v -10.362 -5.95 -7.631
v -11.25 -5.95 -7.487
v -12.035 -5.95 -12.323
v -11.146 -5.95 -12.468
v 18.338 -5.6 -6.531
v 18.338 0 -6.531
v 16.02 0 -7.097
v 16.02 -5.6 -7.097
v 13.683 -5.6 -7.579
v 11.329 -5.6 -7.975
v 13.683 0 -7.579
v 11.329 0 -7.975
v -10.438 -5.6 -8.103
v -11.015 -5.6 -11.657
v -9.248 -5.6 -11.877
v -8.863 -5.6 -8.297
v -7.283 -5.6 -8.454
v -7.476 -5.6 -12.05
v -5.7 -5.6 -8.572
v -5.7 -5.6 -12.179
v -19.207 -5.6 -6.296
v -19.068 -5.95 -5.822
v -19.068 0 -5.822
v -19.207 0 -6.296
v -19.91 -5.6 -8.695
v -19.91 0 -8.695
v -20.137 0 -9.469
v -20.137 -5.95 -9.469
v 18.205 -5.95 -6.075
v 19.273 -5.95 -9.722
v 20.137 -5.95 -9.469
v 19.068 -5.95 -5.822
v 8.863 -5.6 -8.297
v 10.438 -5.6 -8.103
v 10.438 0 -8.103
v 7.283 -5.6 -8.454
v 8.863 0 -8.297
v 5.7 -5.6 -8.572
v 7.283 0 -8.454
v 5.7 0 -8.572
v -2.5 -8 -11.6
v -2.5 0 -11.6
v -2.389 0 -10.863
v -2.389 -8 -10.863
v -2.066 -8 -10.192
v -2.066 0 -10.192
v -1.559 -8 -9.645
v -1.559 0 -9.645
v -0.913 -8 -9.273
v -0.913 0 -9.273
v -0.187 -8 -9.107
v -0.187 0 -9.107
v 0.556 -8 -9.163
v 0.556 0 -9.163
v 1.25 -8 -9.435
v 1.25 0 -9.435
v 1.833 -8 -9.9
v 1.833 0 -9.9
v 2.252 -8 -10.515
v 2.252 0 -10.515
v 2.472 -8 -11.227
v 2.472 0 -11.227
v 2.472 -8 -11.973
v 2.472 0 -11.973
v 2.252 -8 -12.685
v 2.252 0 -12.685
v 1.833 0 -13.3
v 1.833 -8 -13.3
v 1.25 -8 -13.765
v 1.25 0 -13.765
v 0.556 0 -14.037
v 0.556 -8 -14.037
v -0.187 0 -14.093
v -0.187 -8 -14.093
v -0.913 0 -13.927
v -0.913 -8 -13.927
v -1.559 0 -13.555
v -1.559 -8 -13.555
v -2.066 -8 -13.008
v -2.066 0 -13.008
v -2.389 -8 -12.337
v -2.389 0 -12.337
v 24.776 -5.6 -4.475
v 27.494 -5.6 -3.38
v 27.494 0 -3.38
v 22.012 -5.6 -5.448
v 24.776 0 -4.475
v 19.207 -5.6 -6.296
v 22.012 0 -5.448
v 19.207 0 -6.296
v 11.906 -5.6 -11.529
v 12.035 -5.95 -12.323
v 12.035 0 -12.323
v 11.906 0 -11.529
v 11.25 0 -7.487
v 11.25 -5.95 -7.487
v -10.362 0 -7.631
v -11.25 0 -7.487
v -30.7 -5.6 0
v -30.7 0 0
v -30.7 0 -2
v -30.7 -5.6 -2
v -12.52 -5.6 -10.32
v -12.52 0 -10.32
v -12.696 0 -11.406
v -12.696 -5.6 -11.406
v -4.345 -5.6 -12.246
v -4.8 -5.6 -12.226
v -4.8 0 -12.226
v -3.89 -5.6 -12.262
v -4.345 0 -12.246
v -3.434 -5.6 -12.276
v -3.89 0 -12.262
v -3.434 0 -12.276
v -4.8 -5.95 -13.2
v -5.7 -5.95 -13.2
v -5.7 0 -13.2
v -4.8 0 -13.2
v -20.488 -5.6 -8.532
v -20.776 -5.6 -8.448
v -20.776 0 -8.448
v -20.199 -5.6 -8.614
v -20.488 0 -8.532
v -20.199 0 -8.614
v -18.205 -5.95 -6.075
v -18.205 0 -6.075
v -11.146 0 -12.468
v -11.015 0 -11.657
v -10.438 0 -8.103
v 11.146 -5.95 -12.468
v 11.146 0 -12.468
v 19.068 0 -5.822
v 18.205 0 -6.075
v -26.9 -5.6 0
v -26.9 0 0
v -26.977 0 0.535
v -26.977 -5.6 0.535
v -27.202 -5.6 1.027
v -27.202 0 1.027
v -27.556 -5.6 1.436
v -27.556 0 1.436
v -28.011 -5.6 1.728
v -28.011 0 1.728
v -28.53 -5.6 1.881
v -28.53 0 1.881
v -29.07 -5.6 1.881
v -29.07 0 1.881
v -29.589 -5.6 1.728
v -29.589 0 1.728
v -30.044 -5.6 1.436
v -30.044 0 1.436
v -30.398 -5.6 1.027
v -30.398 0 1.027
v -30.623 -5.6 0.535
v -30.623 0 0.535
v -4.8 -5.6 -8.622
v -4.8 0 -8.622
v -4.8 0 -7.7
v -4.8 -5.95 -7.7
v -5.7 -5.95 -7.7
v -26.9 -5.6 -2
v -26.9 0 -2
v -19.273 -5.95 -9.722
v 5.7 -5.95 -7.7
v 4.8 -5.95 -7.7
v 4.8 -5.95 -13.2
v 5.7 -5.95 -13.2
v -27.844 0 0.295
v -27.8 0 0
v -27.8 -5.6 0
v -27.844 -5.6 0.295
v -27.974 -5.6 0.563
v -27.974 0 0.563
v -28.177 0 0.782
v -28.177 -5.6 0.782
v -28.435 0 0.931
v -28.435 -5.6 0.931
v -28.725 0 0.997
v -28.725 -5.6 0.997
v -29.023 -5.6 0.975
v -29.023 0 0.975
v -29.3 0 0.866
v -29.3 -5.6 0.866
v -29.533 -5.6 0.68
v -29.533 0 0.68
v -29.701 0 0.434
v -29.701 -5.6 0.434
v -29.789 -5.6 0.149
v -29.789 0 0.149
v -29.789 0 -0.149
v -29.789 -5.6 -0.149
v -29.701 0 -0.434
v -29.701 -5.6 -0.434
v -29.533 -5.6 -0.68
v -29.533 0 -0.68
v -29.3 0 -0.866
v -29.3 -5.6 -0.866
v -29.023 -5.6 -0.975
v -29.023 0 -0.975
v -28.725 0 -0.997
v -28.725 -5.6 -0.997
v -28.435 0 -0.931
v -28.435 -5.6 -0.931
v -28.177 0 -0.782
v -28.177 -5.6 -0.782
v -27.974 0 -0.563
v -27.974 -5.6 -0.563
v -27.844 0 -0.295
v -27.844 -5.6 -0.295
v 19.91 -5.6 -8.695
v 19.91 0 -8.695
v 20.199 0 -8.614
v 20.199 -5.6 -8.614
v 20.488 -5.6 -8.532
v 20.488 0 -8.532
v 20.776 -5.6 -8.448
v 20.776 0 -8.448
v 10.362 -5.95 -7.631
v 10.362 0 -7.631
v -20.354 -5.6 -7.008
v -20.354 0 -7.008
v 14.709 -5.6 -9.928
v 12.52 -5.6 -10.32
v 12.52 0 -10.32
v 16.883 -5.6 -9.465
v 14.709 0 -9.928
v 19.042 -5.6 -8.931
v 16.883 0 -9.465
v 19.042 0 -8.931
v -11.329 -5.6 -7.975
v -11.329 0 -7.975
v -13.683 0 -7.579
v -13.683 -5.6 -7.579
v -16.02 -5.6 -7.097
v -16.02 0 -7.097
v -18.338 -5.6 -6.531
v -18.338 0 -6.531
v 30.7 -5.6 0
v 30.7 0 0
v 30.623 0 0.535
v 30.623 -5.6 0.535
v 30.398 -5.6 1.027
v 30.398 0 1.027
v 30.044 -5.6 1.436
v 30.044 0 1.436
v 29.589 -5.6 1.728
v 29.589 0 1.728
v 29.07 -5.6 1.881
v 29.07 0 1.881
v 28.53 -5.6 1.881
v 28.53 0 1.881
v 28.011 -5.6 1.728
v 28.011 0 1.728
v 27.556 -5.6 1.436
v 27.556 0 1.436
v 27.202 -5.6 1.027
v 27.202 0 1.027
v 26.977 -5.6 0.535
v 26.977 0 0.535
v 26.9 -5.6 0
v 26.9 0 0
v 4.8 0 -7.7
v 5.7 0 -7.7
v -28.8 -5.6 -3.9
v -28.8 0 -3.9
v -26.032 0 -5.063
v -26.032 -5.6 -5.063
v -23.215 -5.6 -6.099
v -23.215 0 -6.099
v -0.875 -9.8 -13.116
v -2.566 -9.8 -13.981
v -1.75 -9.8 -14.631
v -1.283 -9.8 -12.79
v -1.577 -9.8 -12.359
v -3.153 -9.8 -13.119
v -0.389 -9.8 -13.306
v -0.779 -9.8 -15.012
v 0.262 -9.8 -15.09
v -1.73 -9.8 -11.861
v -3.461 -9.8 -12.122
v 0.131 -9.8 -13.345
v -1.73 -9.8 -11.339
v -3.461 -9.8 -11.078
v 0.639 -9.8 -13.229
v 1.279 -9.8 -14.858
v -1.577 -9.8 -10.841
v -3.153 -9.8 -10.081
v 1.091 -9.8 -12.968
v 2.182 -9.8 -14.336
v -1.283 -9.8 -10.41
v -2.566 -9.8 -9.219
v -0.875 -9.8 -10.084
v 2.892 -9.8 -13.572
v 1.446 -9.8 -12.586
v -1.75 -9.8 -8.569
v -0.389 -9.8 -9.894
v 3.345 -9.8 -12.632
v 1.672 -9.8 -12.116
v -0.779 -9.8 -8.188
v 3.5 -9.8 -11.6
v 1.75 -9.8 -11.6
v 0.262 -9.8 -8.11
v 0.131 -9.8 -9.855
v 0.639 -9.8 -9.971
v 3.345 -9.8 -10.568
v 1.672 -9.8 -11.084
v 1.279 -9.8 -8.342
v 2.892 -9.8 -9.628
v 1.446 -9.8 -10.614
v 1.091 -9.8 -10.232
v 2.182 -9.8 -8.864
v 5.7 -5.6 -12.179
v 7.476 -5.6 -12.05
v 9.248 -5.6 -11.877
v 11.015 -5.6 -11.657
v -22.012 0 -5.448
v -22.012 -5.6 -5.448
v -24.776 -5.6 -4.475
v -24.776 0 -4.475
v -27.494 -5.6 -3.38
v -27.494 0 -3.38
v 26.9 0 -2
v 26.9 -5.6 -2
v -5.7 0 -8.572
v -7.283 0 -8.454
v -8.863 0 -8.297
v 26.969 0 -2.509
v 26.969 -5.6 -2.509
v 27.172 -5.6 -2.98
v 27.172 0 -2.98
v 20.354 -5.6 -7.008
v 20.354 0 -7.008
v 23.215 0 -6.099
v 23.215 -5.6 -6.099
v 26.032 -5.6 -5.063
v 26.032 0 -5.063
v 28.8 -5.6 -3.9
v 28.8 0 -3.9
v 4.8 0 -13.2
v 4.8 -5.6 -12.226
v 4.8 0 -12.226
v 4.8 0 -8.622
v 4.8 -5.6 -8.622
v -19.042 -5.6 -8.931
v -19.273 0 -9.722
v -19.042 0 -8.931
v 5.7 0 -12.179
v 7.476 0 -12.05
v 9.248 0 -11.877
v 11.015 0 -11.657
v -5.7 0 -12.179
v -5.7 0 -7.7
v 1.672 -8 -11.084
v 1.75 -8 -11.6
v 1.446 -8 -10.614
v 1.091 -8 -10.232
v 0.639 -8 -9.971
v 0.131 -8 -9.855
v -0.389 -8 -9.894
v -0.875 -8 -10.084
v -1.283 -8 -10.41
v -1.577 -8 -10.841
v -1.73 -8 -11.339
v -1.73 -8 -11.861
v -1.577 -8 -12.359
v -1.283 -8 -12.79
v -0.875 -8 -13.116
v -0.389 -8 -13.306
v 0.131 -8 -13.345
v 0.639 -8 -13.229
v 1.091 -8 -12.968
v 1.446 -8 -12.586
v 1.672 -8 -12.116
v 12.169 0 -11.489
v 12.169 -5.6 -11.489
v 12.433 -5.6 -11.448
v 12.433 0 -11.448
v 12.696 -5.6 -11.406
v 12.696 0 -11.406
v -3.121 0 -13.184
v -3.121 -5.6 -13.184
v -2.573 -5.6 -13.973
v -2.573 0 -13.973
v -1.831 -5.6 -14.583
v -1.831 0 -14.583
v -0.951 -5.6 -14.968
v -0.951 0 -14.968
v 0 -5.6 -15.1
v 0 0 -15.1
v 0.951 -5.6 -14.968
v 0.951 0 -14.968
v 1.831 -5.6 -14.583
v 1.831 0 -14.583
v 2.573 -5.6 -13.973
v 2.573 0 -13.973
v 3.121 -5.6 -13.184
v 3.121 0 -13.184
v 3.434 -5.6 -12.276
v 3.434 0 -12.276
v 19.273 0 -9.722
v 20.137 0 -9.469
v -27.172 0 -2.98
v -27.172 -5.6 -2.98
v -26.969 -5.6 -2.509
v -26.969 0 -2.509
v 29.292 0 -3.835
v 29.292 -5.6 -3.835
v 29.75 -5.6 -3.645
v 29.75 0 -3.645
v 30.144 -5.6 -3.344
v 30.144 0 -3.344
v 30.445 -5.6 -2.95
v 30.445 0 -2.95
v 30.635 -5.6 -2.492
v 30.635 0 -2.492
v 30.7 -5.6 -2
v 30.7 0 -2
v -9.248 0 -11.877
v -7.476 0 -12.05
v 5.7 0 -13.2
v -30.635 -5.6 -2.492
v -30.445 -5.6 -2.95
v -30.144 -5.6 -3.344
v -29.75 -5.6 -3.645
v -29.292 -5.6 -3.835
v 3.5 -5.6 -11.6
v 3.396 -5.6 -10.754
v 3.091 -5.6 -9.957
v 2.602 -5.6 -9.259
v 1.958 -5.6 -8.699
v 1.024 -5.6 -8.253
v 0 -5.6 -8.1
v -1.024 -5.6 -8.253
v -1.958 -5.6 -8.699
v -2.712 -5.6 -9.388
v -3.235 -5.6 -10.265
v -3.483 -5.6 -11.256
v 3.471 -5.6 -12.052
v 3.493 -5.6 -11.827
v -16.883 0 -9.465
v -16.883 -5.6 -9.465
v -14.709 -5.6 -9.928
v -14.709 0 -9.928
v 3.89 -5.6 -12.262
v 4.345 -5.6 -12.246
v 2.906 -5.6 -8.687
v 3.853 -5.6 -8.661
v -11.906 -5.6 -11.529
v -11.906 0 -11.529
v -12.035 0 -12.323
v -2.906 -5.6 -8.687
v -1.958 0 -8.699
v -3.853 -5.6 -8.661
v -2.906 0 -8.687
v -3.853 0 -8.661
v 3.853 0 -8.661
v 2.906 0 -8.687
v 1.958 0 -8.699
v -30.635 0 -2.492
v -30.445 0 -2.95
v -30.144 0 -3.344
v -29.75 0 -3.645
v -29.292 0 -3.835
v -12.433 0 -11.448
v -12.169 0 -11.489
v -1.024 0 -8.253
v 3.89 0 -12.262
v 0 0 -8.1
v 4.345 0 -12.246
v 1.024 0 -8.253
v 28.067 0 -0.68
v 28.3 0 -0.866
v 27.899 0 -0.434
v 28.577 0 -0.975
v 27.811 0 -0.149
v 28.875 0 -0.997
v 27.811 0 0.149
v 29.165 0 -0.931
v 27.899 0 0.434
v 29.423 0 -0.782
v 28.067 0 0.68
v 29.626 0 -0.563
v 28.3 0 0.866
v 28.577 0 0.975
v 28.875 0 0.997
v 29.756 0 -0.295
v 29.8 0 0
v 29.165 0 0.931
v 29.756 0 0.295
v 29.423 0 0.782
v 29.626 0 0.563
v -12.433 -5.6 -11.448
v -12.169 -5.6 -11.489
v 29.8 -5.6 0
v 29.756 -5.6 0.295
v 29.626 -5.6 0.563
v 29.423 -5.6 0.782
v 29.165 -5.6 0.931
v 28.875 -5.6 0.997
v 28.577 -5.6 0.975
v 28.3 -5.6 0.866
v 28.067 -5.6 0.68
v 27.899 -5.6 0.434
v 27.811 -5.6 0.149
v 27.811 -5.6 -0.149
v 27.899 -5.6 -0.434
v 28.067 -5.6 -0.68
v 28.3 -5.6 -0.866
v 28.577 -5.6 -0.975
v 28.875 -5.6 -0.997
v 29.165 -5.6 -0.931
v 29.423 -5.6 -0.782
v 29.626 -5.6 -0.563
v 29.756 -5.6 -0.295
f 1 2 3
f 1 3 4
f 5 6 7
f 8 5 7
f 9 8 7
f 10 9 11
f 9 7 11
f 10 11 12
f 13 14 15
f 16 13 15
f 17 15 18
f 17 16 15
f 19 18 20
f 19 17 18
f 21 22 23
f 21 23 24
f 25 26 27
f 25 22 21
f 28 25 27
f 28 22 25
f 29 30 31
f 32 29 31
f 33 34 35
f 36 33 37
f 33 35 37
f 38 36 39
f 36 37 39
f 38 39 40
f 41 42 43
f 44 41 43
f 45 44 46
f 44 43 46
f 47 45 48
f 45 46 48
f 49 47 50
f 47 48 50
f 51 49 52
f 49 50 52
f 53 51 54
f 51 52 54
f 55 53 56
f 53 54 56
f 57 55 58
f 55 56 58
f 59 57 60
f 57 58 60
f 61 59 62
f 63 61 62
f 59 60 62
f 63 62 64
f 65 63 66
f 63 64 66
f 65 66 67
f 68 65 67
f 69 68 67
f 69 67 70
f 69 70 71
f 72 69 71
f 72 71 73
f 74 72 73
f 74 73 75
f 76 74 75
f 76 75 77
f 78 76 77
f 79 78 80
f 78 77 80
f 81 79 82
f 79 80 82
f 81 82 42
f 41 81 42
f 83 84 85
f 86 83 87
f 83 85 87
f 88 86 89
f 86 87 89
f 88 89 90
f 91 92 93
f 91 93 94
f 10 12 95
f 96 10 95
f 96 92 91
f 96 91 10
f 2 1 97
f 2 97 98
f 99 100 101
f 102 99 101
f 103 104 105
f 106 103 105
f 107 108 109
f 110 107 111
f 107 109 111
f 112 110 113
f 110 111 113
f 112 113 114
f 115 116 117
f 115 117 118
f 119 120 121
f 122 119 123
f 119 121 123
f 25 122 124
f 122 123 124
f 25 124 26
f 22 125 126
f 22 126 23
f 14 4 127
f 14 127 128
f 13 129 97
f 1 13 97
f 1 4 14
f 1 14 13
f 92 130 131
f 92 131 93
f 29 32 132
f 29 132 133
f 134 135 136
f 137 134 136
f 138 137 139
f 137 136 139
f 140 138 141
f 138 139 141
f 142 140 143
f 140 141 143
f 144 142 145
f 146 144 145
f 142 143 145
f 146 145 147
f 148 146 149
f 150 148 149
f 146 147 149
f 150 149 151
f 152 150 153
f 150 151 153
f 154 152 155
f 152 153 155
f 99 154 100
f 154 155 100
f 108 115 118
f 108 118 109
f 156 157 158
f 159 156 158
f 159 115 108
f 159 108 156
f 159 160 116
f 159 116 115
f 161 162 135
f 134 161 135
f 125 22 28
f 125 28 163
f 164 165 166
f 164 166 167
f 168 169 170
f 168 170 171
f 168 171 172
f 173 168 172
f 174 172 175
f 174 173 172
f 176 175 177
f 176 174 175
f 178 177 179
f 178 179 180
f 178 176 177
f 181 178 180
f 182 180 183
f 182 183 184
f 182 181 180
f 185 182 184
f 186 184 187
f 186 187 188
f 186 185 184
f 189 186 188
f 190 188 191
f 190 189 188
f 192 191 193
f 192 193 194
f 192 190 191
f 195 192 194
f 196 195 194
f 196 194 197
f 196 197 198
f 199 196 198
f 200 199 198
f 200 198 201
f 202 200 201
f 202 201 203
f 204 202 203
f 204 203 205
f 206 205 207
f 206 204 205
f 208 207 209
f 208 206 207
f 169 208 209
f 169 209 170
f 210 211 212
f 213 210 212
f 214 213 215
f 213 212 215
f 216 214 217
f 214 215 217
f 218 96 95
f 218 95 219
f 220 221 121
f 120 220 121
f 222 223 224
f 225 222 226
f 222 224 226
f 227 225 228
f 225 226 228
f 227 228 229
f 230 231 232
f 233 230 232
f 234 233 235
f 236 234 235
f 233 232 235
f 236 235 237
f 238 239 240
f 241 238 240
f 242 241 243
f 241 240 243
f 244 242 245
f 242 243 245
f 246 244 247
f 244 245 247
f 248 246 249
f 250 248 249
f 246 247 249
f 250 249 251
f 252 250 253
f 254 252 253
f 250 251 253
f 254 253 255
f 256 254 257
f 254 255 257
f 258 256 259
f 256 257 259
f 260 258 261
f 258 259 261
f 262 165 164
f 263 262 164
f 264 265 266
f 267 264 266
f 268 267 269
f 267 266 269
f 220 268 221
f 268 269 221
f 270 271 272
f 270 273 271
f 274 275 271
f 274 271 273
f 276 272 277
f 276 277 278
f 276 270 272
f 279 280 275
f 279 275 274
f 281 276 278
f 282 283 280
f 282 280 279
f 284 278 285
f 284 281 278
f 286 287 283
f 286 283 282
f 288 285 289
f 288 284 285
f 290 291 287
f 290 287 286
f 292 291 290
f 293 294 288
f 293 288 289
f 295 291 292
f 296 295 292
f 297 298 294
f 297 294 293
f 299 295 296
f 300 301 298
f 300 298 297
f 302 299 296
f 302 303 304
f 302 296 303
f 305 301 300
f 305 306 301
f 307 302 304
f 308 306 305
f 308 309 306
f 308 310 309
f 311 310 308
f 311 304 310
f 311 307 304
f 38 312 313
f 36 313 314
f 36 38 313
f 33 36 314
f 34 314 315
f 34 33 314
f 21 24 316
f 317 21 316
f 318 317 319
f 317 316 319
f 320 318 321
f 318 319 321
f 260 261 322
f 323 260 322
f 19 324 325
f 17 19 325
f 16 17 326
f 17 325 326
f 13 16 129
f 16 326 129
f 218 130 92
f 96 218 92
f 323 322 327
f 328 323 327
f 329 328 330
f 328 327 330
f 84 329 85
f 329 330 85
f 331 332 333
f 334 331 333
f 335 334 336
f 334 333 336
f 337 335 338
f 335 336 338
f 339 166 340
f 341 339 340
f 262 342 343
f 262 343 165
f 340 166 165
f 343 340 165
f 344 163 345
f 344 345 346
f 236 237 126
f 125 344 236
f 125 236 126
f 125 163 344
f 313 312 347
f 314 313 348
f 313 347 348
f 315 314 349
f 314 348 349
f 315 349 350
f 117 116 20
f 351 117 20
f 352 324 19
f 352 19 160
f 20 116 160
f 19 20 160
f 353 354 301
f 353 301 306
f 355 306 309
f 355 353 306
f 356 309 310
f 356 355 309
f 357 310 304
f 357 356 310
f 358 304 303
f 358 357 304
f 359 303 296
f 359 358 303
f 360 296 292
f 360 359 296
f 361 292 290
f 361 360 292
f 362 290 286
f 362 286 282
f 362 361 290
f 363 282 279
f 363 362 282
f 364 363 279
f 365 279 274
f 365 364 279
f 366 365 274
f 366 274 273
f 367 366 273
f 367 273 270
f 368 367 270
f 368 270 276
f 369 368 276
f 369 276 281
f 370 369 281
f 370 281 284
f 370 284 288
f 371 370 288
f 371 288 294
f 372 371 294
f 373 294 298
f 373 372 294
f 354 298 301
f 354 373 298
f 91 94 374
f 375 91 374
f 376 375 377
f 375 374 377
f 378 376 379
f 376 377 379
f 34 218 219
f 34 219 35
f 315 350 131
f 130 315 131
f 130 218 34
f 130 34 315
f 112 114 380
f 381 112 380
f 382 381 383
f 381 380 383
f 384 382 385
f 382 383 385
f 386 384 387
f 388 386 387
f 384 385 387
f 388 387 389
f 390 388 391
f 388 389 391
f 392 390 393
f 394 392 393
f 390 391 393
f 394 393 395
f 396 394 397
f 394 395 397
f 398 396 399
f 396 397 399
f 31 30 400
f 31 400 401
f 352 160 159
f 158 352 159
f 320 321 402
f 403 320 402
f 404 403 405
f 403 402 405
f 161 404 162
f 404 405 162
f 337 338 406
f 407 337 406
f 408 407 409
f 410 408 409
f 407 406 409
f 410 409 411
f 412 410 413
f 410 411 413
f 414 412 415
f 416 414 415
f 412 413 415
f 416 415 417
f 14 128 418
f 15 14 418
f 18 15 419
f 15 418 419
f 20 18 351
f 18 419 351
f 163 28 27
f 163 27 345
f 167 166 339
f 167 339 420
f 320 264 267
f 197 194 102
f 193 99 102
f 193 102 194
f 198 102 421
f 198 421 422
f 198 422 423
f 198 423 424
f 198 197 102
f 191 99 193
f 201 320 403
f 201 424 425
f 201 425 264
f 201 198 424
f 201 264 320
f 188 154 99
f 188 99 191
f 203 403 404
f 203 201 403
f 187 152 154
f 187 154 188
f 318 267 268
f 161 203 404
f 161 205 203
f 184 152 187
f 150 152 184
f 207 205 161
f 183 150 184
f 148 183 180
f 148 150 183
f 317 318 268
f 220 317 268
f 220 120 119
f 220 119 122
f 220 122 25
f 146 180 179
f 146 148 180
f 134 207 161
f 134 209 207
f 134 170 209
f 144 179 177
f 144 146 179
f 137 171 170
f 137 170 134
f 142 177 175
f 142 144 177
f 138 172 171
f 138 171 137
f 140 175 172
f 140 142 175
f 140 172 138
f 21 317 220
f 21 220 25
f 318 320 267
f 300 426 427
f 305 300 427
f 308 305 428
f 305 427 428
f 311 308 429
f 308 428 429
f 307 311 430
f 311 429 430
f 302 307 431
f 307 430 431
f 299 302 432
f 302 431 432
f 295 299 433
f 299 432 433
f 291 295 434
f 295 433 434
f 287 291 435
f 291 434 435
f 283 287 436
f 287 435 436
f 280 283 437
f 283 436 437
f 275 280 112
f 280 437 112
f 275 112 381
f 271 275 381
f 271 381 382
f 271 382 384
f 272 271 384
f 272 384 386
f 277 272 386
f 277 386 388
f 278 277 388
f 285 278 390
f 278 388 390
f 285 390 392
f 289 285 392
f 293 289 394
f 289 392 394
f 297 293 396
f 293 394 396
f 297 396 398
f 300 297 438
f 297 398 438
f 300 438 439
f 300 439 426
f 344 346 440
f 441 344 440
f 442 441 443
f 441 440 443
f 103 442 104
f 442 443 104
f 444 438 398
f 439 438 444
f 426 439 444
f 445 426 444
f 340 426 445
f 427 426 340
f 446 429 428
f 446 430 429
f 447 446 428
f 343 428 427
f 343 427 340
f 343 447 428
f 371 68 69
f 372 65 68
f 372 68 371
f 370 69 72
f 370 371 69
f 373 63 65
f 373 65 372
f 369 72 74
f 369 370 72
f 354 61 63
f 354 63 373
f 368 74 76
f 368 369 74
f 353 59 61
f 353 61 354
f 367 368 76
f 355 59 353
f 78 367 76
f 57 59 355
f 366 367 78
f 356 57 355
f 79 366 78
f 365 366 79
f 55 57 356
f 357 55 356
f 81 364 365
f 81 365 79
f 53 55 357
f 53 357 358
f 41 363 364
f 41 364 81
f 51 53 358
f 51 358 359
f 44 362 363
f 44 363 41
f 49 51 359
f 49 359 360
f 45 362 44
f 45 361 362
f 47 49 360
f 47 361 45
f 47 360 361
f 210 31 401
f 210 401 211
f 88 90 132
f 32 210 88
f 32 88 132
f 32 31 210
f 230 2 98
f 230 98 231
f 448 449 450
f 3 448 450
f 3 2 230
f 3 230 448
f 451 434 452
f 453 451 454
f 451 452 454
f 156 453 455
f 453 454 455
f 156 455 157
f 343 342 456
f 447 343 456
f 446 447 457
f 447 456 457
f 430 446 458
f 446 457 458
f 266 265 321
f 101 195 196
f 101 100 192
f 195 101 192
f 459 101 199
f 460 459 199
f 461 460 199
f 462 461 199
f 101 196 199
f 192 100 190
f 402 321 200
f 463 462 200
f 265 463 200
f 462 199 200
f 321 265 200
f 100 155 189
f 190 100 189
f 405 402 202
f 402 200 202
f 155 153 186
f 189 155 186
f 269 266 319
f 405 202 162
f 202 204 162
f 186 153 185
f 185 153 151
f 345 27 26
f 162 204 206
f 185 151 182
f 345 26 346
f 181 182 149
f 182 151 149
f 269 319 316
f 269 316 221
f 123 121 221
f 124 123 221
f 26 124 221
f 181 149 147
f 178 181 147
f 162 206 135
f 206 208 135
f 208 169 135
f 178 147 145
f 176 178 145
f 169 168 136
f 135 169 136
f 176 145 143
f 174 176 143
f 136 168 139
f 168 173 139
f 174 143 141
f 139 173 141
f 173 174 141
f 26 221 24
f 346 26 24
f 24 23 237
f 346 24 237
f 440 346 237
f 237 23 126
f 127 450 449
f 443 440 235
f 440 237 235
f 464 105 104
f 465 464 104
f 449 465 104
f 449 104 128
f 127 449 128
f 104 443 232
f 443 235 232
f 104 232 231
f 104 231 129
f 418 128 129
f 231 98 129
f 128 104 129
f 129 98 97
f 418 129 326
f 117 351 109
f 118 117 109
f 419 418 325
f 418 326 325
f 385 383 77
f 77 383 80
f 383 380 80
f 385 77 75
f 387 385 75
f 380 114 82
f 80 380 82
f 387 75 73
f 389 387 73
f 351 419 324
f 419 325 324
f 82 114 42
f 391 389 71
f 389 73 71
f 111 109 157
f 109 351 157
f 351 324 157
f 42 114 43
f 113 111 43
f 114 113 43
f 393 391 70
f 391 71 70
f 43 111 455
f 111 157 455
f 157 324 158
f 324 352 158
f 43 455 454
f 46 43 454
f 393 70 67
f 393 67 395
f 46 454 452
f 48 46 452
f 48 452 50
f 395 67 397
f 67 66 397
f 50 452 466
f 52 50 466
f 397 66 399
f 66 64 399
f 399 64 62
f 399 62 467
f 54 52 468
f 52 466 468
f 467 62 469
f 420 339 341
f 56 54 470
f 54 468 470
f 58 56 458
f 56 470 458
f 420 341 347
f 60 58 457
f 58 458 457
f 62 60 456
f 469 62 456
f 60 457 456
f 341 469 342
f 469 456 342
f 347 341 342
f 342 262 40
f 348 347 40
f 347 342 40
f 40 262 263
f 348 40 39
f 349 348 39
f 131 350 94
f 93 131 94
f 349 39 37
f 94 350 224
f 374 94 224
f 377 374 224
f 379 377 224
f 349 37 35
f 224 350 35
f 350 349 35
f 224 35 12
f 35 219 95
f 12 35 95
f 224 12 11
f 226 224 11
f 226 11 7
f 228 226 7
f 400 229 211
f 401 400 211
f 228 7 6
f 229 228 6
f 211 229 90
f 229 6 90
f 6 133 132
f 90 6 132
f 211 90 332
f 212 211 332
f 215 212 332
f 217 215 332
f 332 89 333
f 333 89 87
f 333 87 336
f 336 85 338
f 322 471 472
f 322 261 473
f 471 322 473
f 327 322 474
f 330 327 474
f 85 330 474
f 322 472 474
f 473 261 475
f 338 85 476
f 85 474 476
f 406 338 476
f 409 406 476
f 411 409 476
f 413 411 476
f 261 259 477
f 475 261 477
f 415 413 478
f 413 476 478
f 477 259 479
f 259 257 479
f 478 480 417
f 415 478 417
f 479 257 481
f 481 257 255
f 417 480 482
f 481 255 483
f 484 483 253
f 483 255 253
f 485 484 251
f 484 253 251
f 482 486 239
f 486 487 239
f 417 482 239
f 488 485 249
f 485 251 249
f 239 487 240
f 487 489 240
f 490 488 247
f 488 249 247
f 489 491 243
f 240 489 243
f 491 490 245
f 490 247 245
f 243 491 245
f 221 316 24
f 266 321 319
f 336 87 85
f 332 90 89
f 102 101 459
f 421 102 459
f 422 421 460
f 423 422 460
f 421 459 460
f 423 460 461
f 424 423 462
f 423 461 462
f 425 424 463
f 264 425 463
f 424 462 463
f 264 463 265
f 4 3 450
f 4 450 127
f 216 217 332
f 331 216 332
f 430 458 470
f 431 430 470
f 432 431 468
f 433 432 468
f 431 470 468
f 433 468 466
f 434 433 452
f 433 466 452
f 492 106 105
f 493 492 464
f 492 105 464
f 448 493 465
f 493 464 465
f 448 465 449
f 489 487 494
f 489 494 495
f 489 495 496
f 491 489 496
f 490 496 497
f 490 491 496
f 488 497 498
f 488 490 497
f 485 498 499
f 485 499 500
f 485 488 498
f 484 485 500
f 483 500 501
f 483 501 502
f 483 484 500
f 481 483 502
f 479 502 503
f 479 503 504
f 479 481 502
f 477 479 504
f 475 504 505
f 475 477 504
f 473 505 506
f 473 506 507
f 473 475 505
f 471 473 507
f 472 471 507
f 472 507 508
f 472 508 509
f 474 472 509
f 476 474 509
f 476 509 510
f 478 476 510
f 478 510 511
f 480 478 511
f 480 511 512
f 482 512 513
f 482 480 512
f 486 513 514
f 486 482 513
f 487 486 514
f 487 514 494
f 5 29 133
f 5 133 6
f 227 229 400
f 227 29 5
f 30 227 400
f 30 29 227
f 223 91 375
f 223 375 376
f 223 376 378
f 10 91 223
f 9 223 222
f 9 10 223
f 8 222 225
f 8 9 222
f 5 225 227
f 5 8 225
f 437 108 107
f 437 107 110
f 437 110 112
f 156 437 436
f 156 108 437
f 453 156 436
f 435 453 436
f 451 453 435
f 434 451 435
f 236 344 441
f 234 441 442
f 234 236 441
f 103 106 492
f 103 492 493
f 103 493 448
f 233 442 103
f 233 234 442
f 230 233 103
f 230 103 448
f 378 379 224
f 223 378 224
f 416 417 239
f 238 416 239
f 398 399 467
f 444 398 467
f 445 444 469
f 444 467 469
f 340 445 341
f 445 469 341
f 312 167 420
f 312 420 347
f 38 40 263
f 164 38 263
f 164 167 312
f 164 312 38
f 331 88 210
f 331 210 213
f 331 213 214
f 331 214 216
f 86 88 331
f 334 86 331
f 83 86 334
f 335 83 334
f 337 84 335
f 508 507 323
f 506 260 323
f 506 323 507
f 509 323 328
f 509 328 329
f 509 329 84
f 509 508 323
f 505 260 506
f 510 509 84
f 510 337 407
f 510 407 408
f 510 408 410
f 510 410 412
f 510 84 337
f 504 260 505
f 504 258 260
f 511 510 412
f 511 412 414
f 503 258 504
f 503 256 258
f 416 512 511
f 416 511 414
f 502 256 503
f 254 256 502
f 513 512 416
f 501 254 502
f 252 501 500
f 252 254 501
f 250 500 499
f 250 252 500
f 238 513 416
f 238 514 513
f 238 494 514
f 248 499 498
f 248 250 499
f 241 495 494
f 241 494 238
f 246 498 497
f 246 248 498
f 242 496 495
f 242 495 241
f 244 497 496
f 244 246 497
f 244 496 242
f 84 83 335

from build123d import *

# Parameters (mm, degrees)
F0_R     = 1.75
F0_R_2   = 1
F1_DEPTH = 5.6
F3_W     = 0.9
F3_H     = 5.5
F4_DEPTH = 5.95
F5_R     = 3.5
F5_R_2   = 1.75
F6_DEPTH = 4.2
F7_R     = 2.5
F8_DEPTH = 8


with BuildPart() as f1:
    # F0 (on Front) → F1 (new body)
    with BuildSketch(Plane.XZ):
        with BuildLine():
            Line((-26.9, -2), (-26.9, 0))
            ThreePointArc((-26.9, 0), (-28.8, 1.9), (-30.7, 0))
            Line((-30.7, 0), (-30.7, -2))
            ThreePointArc((-30.7, -2), (-30.1435028843, -3.3435028843), (-28.8, -3.9))
            ThreePointArc((-28.8, -3.9), (-24.6294135718, -5.596855554), (-20.3538194655, -7.0083813116))
            Line((-20.3538194655, -7.0083813116), (-20.7757003916, -8.4478313747))
            ThreePointArc((-20.7757003916, -8.4478313747), (-16.6769659984, -9.5120684601), (-12.5200691265, -10.3198014574))
            Line((-12.5200691265, -10.3198014574), (-12.696252722, -11.4056003986))
            ThreePointArc((-12.696252722, -11.4056003986), (-8.0798243817, -11.9962992417), (-3.4341530829, -12.2757163632))
            ThreePointArc((-3.4341530829, -12.2757163632), (0, -15.1), (3.4341530829, -12.2757163632))
            ThreePointArc((3.4341530829, -12.2757163632), (3.235336932, -10.2648614543), (1.9581459203, -8.699023517))
            ThreePointArc((1.9581459203, -8.699023517), (0, -8.1), (-1.9581459203, -8.699023517))
            ThreePointArc((-1.9581459203, -8.699023517), (-14.9928565077, -7.3200147056), (-27.4941674529, -3.3801454123))
            ThreePointArc((-27.4941674529, -3.3801454123), (-27.0548521783, -2.7513049183), (-26.9, -2))
        make_face()
        with Locations((0, -11.6)):
            Circle(F0_R, mode=Mode.SUBTRACT)
        with Locations((-28.8, 0)):
            Circle(F0_R_2, mode=Mode.SUBTRACT)
        with BuildLine():
            ThreePointArc((27.4941674529, -3.3801454123), (14.9928565077, -7.3200147056), (1.9581459203, -8.699023517))
            ThreePointArc((1.9581459203, -8.699023517), (3.235336932, -10.2648614543), (3.4341530829, -12.2757163632))
            ThreePointArc((3.4341530829, -12.2757163632), (8.0798243817, -11.9962992417), (12.696252722, -11.4056003986))
            Line((12.696252722, -11.4056003986), (12.5200691265, -10.3198014574))
            ThreePointArc((12.5200691265, -10.3198014574), (16.6769659984, -9.5120684601), (20.7757003916, -8.4478313747))
            Line((20.7757003916, -8.4478313747), (20.3538194655, -7.0083813116))
            ThreePointArc((20.3538194655, -7.0083813116), (24.6294135718, -5.596855554), (28.8, -3.9))
            ThreePointArc((28.8, -3.9), (30.1435028843, -3.3435028843), (30.7, -2))
            Line((30.7, -2), (30.7, 0))
            ThreePointArc((30.7, 0), (28.8, 1.9), (26.9, 0))
            Line((26.9, 0), (26.9, -2))
            ThreePointArc((26.9, -2), (27.0548521783, -2.7513049183), (27.4941674529, -3.3801454123))
        make_face()
        with Locations((28.8, 0)):
            Circle(F0_R_2, mode=Mode.SUBTRACT)
    extrude(amount=F1_DEPTH)

    # F3 (on offset) → F4 (join, through all)
    with BuildSketch(Plane.XZ.offset(5.95)):
        Polygon((-18.2045984637, -6.0751883598), (-19.0682685015, -5.8220598041), (-20.1370335143, -9.4686666307), (-19.2733634764, -9.7217951863), align=None)
        Polygon((-10.3615155022, -7.6308153564), (-11.2498964541, -7.4866651419), (-12.0347142888, -12.3234058798), (-11.146333337, -12.4675560944), align=None)
        with Locations((-5.25, -10.45)):
            Rectangle(F3_W, F3_H)
        with Locations((5.25, -10.45)):
            Rectangle(F3_W, F3_H)
        Polygon((11.146333337, -12.4675560944), (12.0347142888, -12.3234058798), (11.2498964541, -7.4866651419), (10.3615155022, -7.6308153564), align=None)
        Polygon((20.1370335143, -9.4686666307), (19.0682685015, -5.8220598041), (18.2045984637, -6.0751883598), (19.2733634764, -9.7217951863), align=None)
    extrude(amount=-F4_DEPTH)

    # F5 (on face) → F6 (join)
    with BuildSketch(Plane.XZ.offset(5.6)):
        with Locations((0, -11.6)):
            Circle(F5_R)
        with Locations((0, -11.6)):
            Circle(F5_R_2, mode=Mode.SUBTRACT)
    extrude(amount=F6_DEPTH)

    # F7 (on face) → F8 (cut)
    with BuildSketch(Plane(origin=(0, 0, 0), x_dir=(-1, 0, 0), z_dir=(0, 1, 0))):
        with Locations((0, -11.6)):
            Circle(F7_R)
    extrude(amount=-F8_DEPTH, mode=Mode.SUBTRACT)


solid = f1.part
